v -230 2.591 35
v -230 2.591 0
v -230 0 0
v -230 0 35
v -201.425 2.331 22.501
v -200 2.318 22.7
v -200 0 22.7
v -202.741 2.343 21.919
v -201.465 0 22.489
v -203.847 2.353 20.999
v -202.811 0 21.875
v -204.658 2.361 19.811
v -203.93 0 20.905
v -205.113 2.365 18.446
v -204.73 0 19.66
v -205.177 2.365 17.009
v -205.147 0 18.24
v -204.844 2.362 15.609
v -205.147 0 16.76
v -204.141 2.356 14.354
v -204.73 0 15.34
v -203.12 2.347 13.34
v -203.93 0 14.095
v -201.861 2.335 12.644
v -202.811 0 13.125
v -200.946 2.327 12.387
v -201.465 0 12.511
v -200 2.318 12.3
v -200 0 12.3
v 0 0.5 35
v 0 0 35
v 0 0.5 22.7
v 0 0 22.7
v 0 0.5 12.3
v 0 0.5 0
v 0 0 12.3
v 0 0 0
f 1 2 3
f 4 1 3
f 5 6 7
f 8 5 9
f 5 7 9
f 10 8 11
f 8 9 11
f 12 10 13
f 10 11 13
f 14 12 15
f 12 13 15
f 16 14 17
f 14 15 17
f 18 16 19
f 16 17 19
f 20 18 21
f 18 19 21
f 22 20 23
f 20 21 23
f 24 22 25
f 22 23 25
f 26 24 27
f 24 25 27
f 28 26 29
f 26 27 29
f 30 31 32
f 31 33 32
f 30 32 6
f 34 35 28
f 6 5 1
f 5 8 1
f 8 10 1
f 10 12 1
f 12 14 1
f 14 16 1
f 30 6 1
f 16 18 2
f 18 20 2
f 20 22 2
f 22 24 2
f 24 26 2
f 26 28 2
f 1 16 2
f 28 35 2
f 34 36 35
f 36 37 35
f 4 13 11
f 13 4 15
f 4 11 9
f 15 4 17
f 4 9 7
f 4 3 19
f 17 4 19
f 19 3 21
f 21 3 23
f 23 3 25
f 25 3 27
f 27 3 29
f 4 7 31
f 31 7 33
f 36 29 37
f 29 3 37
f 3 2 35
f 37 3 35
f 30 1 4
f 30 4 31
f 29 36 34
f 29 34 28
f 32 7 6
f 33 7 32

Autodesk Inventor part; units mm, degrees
ref_plane "YZ Plane" through (0, 0, 0) normal (1, 0, 0) x (0, 1, 0)
ref_plane "XZ Plane" through (0, 0, 0) normal (0, 1, 0) x (-1, 0, 0)
ref_plane "XY Plane" through (0, 0, 0) normal (0, 0, 1) x (1, 0, 0)
sketch "Sketch1" plane through (0, 0, 0) normal (0, 0, 1) x (1, 0, 0)
  line L0 (0, 0) -> (0, 0.5)
  line L1 (0, 0.5) -> (-230, 2.5909)
  line L2 (-230, 2.5909) -> (-230, 0)
  line L3 (-230, 0) -> (0, 0)
  line L4 (-55, 0) -> (-55, 1)
  dimension "d0" = 55
  dimension "d1" = 1
  dimension "d2" = 0.5
  dimension "d10" = 230
extrude "Extrusion1" add sketch "Sketch1" along normal blind 35
sketch "Sketch2" plane through (-230, 0, 0) normal (0, -1, 0) x (1, 0, 0)
  line L0 (230, 0) -> (230, 35) projected
  line L1 (230, 17.5) -> (30, 17.5) construction
  line L2 (230, 12.3) -> (30, 12.3)
  line L3 (30, 22.7) -> (230, 22.7)
  arc A0 (230, 12.3) -> (230, 22.7) centre (230, 17.5) ccw
  arc A1 (30, 22.7) -> (30, 12.3) centre (30, 17.5) ccw
  point P0 (130, 17.5)
  dimension "d6" = 200
  dimension "d7" = 5.2
extrude "Extrusion2" cut sketch "Sketch2" against normal through all contours L2 A1 L3 L0
properties part number "WinderSpoolRemovalAid"
